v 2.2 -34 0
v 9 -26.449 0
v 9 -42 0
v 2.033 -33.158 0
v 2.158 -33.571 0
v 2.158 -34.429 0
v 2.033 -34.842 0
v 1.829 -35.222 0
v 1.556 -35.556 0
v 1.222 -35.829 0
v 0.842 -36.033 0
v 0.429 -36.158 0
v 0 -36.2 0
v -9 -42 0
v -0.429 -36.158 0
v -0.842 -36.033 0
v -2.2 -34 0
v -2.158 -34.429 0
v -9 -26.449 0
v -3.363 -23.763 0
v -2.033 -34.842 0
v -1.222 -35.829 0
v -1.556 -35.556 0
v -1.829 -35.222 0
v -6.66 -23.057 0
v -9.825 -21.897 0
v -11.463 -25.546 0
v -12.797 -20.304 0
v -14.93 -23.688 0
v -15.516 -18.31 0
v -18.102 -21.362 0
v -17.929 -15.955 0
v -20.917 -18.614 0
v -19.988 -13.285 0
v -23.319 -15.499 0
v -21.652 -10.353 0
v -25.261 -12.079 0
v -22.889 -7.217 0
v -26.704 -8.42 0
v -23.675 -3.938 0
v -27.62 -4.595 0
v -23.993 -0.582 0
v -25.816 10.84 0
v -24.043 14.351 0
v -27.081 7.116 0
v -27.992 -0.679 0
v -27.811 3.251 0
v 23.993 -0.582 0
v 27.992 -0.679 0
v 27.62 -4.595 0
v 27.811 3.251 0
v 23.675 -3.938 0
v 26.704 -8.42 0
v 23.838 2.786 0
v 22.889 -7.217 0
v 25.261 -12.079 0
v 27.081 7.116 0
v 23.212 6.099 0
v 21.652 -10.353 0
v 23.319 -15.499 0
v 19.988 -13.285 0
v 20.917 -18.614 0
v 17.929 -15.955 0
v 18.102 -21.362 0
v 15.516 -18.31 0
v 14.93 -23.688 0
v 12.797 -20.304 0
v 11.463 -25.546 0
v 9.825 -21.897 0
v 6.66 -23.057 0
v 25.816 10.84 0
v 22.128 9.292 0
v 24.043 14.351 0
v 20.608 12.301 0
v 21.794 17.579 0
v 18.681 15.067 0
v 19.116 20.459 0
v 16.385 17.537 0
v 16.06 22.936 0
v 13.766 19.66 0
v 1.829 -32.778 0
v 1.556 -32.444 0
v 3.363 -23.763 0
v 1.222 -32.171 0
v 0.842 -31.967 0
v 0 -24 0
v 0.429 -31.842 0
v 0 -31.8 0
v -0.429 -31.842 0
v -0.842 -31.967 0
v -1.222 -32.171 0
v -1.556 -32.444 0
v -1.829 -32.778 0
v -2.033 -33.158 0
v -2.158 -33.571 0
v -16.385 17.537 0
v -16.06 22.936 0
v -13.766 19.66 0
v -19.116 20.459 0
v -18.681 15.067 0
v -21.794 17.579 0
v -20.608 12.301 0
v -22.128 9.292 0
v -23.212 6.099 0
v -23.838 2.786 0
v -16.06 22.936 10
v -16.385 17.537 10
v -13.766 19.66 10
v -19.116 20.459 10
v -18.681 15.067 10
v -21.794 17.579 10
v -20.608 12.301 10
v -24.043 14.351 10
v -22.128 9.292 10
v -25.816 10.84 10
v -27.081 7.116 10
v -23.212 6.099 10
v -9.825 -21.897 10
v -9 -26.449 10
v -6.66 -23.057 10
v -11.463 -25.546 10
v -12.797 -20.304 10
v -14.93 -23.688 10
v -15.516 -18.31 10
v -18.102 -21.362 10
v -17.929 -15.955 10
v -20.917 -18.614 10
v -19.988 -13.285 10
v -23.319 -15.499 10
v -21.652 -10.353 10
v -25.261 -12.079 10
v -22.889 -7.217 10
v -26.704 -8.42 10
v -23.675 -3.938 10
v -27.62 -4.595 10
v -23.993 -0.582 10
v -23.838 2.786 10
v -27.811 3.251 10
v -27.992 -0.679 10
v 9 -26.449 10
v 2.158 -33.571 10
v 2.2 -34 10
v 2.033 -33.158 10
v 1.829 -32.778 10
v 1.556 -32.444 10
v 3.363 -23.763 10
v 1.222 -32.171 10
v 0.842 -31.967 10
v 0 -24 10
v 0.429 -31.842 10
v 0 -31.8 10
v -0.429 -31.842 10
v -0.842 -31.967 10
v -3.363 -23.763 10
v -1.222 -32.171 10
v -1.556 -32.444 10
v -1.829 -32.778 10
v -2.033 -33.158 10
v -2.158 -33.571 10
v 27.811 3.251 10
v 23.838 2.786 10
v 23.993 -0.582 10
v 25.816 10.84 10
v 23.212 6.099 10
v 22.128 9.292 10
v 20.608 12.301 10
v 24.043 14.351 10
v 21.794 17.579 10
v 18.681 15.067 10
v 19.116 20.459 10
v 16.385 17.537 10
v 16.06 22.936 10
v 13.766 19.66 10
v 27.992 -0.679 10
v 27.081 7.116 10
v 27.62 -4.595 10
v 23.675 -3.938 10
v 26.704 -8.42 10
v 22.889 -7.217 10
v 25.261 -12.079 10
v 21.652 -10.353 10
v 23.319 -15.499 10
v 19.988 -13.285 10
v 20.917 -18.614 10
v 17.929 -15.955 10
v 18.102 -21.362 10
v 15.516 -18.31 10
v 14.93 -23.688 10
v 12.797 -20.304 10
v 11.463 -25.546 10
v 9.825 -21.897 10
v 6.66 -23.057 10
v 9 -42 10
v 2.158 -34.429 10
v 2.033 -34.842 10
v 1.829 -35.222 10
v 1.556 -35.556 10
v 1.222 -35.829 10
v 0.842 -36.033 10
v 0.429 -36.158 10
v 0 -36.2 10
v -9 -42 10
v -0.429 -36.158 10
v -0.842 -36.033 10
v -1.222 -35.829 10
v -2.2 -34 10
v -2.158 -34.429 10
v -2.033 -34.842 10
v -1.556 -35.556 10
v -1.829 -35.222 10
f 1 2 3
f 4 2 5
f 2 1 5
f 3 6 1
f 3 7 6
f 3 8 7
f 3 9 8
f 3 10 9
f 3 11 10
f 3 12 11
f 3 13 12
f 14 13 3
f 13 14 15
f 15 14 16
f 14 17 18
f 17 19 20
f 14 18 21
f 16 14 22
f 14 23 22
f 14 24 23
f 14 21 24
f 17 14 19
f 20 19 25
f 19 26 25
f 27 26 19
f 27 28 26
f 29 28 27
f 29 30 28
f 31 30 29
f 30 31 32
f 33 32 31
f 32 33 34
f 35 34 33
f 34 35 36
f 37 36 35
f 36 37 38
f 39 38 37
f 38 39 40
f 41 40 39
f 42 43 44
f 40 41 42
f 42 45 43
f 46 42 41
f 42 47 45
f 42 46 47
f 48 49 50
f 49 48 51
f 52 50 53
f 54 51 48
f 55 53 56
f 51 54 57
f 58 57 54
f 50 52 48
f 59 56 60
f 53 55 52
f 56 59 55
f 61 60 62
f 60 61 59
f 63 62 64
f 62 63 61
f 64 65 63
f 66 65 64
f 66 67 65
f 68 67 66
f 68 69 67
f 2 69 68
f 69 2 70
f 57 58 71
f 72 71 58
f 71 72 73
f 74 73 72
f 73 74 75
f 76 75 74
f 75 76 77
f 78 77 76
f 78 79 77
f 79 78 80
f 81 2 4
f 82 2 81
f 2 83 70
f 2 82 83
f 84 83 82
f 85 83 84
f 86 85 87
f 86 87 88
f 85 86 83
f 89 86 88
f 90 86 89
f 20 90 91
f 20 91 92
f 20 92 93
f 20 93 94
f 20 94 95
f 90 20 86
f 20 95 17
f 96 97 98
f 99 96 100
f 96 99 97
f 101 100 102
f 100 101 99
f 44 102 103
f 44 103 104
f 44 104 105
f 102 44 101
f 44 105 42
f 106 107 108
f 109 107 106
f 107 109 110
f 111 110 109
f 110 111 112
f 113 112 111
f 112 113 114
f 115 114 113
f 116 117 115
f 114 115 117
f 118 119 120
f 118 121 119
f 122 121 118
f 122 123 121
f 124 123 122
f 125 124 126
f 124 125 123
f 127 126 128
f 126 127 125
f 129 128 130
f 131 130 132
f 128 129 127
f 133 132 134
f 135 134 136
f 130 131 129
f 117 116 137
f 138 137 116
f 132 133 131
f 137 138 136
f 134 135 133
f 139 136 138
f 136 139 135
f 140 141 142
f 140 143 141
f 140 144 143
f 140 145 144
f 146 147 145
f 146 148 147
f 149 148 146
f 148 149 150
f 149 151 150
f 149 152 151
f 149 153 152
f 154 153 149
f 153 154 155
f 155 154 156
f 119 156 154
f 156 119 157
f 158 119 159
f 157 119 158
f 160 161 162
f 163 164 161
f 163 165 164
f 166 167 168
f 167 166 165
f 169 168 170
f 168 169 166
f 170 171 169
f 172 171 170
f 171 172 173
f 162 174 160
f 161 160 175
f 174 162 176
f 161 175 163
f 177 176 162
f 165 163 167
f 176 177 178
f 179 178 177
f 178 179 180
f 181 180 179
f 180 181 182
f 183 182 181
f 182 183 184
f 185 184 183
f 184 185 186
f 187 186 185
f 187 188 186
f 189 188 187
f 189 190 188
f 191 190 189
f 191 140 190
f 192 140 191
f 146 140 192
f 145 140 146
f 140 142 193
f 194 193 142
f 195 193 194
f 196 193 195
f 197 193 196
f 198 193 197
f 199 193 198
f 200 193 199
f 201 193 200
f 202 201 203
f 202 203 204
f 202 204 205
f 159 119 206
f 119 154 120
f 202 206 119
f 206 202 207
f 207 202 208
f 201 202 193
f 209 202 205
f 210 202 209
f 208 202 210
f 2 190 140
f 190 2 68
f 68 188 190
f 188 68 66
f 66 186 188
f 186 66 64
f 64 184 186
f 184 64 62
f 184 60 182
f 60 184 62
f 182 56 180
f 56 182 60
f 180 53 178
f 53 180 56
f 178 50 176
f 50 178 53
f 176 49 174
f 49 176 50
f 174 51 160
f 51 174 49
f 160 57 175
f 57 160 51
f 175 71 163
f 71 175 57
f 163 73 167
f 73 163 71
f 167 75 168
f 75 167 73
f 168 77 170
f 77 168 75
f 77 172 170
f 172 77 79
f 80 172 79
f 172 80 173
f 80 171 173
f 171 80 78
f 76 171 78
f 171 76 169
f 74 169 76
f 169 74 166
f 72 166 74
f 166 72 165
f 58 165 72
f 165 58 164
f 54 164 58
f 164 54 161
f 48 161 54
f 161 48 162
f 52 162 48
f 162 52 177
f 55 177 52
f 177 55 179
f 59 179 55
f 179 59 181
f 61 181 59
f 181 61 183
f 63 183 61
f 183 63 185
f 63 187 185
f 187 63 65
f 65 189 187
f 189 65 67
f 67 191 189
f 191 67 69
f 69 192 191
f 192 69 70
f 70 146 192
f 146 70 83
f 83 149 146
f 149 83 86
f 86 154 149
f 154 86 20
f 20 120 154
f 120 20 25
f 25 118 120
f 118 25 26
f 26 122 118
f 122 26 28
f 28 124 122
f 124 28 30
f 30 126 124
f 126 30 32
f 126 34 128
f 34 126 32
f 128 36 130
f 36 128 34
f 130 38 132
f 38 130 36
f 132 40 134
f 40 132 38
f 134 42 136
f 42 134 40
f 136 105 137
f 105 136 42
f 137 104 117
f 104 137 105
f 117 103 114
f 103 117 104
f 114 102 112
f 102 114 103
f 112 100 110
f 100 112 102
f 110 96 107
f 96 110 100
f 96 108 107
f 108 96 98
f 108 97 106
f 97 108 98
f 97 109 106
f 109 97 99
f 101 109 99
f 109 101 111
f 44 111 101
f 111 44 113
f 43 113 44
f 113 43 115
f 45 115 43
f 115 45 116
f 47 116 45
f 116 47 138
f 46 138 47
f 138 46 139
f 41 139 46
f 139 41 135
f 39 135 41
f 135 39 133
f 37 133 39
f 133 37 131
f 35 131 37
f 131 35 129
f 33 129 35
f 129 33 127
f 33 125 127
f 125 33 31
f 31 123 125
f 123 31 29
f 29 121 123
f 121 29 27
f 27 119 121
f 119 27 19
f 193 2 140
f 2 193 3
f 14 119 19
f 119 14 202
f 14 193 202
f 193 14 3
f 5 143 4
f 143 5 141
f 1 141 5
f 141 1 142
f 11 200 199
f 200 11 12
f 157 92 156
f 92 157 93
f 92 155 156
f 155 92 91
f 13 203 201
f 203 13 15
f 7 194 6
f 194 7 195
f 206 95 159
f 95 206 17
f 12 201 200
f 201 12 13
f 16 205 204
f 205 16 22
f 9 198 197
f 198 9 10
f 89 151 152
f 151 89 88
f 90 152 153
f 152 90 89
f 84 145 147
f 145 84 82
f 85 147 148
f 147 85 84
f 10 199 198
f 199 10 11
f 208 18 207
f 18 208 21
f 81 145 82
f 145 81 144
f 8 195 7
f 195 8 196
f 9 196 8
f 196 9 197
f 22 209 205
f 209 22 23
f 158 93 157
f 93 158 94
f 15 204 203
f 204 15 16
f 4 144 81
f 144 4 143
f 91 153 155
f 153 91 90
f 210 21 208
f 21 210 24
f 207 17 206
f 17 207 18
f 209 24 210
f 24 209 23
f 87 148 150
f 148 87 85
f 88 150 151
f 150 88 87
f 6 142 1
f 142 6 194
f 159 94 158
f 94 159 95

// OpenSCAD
$fn = 32;

// ----------------------------------------------------------------------
// Spring clip: 56 mm outside, 4 mm band, 70 degree opening
// ----------------------------------------------------------------------

// --- parameters (mm) ---
outer_r = 28;             // clip outside radius
inner_r = 24;             // clip bore radius
band = 4;                 // band thickness
clip_w = 10;              // clip width
opening = 70;             // opening angle
tab_w = 18;               // tab width
tab_len = 14;             // tab length past the clip
tab_hole = 4.4;           // tab fixing hole

clip_profile = [[-16.06, 22.936], [-19.116, 20.459], [-21.794, 17.579], [-24.043, 14.351], [-25.816, 10.84], [-27.081, 7.116], [-27.811, 3.251], [-27.992, -0.679], [-27.62, -4.595], [-26.704, -8.42], [-25.261, -12.079], [-23.319, -15.499], [-20.917, -18.614], [-18.102, -21.362], [-14.93, -23.688], [-11.463, -25.546], [-7.77, -26.9], [-3.924, -27.724], [0, -28], [3.924, -27.724], [7.77, -26.9], [11.463, -25.546], [14.93, -23.688], [18.102, -21.362], [20.917, -18.614], [23.319, -15.499], [25.261, -12.079], [26.704, -8.42], [27.62, -4.595], [27.992, -0.679], [27.811, 3.251], [27.081, 7.116], [25.816, 10.84], [24.043, 14.351], [21.794, 17.579], [19.116, 20.459], [16.06, 22.936], [13.766, 19.66], [16.385, 17.537], [18.681, 15.067], [20.608, 12.301], [22.128, 9.292], [23.212, 6.099], [23.838, 2.786], [23.993, -0.582], [23.675, -3.938], [22.889, -7.217], [21.652, -10.353], [19.988, -13.285], [17.929, -15.955], [15.516, -18.31], [12.797, -20.304], [9.825, -21.897], [6.66, -23.057], [3.363, -23.763], [0, -24], [-3.363, -23.763], [-6.66, -23.057], [-9.825, -21.897], [-12.797, -20.304], [-15.516, -18.31], [-17.929, -15.955], [-19.988, -13.285], [-21.652, -10.353], [-22.889, -7.217], [-23.675, -3.938], [-23.993, -0.582], [-23.838, 2.786], [-23.212, 6.099], [-22.128, 9.292], [-20.608, 12.301], [-18.681, 15.067], [-16.385, 17.537], [-13.766, 19.66]];

difference() {
  union() {
    linear_extrude(height = clip_w) polygon(clip_profile);
    /* mounting tab, sunk 2 mm into the band */
    translate([-9, -42, 0]) cube([tab_w, 16, clip_w]);
  }
  translate([0, -34, -2.5]) cylinder(h = clip_w + 5, d = tab_hole);
}
